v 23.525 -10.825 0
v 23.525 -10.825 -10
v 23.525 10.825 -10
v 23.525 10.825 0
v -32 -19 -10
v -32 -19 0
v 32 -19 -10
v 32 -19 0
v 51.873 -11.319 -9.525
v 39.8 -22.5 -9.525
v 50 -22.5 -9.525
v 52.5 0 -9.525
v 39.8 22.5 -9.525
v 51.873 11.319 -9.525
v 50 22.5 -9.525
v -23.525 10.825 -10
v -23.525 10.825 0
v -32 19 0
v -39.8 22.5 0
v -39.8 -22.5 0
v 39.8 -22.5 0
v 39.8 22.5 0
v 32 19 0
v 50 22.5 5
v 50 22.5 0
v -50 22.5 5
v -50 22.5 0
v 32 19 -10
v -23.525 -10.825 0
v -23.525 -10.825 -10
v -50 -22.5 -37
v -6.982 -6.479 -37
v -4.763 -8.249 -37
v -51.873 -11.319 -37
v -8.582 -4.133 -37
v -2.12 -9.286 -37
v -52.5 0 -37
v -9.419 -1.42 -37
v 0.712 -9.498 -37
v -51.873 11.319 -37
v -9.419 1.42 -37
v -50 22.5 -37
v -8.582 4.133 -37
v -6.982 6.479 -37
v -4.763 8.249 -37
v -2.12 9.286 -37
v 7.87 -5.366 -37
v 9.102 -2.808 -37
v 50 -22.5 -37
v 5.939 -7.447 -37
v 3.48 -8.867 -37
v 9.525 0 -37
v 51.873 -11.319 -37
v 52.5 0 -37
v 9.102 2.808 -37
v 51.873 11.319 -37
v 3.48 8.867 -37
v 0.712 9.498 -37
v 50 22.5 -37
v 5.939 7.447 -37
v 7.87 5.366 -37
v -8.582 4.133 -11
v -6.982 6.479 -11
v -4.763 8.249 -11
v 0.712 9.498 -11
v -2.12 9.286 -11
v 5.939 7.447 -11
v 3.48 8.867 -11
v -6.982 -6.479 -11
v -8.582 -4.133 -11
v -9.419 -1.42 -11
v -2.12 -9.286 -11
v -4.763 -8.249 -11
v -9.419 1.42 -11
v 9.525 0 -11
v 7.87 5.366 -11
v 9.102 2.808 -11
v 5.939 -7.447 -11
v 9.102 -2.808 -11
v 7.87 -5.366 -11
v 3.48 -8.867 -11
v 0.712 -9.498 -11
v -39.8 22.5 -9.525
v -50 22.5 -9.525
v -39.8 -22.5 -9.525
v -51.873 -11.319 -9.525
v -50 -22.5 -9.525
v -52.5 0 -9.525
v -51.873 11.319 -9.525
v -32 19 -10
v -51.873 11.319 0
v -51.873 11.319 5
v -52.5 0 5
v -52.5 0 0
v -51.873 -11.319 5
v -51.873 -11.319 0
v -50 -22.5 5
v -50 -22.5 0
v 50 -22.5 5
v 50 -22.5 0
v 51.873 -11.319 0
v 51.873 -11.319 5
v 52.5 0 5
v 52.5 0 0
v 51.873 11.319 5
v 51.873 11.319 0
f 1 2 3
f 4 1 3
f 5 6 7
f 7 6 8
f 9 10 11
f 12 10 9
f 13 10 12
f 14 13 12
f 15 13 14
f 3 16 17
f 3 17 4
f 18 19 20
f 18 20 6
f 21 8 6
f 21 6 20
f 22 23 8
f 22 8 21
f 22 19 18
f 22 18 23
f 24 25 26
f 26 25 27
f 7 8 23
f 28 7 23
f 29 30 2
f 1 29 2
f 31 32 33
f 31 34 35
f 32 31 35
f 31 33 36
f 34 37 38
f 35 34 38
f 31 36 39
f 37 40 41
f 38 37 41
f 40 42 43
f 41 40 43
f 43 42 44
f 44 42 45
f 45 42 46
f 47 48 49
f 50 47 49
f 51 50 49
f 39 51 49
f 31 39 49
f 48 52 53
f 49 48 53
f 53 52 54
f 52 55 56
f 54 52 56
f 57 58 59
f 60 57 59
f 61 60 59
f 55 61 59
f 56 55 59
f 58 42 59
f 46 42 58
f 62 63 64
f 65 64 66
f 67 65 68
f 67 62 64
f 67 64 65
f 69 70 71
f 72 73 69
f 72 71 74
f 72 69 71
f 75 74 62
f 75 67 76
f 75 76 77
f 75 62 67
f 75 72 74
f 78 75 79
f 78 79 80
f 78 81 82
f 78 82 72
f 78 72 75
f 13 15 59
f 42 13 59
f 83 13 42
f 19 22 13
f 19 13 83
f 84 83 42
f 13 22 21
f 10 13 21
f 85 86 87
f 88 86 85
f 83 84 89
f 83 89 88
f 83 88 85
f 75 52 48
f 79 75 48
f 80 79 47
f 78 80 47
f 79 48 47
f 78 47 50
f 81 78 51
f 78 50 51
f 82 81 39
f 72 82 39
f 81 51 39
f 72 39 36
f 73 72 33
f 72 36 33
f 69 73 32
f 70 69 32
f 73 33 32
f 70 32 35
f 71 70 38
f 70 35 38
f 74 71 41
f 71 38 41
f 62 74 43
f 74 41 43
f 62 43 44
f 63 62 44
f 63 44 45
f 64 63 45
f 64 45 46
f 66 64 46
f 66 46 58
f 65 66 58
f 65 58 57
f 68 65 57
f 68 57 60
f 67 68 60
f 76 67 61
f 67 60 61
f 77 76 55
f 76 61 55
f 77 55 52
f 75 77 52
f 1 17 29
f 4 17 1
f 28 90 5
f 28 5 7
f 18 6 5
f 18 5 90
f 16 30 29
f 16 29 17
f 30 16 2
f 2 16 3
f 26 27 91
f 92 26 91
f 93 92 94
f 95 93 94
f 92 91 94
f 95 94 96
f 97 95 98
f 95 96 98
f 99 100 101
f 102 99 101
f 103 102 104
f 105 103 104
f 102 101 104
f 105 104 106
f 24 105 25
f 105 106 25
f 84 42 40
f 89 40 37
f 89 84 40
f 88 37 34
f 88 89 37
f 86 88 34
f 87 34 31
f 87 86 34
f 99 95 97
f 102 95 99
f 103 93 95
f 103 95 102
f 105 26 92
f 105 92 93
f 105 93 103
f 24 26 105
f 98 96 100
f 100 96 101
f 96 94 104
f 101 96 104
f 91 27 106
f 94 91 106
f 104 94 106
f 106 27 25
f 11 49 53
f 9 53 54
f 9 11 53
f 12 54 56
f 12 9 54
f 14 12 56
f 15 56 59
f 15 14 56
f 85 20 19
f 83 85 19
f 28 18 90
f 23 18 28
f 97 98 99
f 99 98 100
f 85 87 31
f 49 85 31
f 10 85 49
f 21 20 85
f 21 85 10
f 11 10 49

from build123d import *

# Parameters (mm, degrees)
F1_DEPTH  = 37
F2_W      = 64
F2_H      = 38
F3_DEPTH  = 10
F5_DEPTH  = 9.525
F6_W      = 47.05
F6_H      = 21.65
F7_DEPTH  = 10
F9_DEPTH  = 5
F10_R     = 9.525
F11_DEPTH = 26


with BuildPart() as f1:
    # F0 (on Top) → F1 (new body)
    with BuildSketch(Plane.XY):
        with BuildLine():
            Line((50, 22.5), (-50, 22.5))
            ThreePointArc((-50, 22.5), (-52.5, 0), (-50, -22.5))
            Line((-50, -22.5), (50, -22.5))
            ThreePointArc((50, -22.5), (52.5, 0), (50, 22.5))
        make_face()
    extrude(amount=-F1_DEPTH)

    # F2 (on face) → F3 (cut)
    with BuildSketch(Plane.XY):
        Rectangle(F2_W, F2_H)
    extrude(amount=-F3_DEPTH, mode=Mode.SUBTRACT)

    # F4 (on face) → F5 (cut)
    with BuildSketch(Plane.XY):
        with BuildLine():
            Line((-39.8, -22.5), (-39.8, 22.5))
            Line((-39.8, 22.5), (-50, 22.5))
            ThreePointArc((-50, 22.5), (-52.5, 0), (-50, -22.5))
            Line((-50, -22.5), (-39.8, -22.5))
        make_face()
        with BuildLine():
            Line((50, 22.5), (39.8, 22.5))
            Line((39.8, 22.5), (39.8, -22.5))
            Line((39.8, -22.5), (50, -22.5))
            ThreePointArc((50, -22.5), (52.5, 0), (50, 22.5))
        make_face()
    extrude(amount=-F5_DEPTH, mode=Mode.SUBTRACT)

    # F10 (on face) → F11 (cut)
    with BuildSketch(Plane(origin=(0, 0, -37), x_dir=(1, 0, 0), z_dir=(0, 0, -1))):
        Circle(F10_R)
    extrude(amount=-F11_DEPTH, mode=Mode.SUBTRACT)


with BuildPart() as f7:
    # F6 (on face) → F7 (new body)
    with BuildSketch(Plane.XY.offset(-10)):
        Rectangle(F6_W, F6_H)
    extrude(amount=F7_DEPTH)


with BuildPart() as f9:
    # F8 (on face) → F9 (new body)
    with BuildSketch(Plane.XY):
        with BuildLine():
            Line((50, 22.5), (-50, 22.5))
            ThreePointArc((-50, 22.5), (-52.5, 0), (-50, -22.5))
            Line((-50, -22.5), (50, -22.5))
            ThreePointArc((50, -22.5), (52.5, 0), (50, 22.5))
        make_face()
    extrude(amount=F9_DEPTH)


solid = Compound([f1.part, f7.part, f9.part])
